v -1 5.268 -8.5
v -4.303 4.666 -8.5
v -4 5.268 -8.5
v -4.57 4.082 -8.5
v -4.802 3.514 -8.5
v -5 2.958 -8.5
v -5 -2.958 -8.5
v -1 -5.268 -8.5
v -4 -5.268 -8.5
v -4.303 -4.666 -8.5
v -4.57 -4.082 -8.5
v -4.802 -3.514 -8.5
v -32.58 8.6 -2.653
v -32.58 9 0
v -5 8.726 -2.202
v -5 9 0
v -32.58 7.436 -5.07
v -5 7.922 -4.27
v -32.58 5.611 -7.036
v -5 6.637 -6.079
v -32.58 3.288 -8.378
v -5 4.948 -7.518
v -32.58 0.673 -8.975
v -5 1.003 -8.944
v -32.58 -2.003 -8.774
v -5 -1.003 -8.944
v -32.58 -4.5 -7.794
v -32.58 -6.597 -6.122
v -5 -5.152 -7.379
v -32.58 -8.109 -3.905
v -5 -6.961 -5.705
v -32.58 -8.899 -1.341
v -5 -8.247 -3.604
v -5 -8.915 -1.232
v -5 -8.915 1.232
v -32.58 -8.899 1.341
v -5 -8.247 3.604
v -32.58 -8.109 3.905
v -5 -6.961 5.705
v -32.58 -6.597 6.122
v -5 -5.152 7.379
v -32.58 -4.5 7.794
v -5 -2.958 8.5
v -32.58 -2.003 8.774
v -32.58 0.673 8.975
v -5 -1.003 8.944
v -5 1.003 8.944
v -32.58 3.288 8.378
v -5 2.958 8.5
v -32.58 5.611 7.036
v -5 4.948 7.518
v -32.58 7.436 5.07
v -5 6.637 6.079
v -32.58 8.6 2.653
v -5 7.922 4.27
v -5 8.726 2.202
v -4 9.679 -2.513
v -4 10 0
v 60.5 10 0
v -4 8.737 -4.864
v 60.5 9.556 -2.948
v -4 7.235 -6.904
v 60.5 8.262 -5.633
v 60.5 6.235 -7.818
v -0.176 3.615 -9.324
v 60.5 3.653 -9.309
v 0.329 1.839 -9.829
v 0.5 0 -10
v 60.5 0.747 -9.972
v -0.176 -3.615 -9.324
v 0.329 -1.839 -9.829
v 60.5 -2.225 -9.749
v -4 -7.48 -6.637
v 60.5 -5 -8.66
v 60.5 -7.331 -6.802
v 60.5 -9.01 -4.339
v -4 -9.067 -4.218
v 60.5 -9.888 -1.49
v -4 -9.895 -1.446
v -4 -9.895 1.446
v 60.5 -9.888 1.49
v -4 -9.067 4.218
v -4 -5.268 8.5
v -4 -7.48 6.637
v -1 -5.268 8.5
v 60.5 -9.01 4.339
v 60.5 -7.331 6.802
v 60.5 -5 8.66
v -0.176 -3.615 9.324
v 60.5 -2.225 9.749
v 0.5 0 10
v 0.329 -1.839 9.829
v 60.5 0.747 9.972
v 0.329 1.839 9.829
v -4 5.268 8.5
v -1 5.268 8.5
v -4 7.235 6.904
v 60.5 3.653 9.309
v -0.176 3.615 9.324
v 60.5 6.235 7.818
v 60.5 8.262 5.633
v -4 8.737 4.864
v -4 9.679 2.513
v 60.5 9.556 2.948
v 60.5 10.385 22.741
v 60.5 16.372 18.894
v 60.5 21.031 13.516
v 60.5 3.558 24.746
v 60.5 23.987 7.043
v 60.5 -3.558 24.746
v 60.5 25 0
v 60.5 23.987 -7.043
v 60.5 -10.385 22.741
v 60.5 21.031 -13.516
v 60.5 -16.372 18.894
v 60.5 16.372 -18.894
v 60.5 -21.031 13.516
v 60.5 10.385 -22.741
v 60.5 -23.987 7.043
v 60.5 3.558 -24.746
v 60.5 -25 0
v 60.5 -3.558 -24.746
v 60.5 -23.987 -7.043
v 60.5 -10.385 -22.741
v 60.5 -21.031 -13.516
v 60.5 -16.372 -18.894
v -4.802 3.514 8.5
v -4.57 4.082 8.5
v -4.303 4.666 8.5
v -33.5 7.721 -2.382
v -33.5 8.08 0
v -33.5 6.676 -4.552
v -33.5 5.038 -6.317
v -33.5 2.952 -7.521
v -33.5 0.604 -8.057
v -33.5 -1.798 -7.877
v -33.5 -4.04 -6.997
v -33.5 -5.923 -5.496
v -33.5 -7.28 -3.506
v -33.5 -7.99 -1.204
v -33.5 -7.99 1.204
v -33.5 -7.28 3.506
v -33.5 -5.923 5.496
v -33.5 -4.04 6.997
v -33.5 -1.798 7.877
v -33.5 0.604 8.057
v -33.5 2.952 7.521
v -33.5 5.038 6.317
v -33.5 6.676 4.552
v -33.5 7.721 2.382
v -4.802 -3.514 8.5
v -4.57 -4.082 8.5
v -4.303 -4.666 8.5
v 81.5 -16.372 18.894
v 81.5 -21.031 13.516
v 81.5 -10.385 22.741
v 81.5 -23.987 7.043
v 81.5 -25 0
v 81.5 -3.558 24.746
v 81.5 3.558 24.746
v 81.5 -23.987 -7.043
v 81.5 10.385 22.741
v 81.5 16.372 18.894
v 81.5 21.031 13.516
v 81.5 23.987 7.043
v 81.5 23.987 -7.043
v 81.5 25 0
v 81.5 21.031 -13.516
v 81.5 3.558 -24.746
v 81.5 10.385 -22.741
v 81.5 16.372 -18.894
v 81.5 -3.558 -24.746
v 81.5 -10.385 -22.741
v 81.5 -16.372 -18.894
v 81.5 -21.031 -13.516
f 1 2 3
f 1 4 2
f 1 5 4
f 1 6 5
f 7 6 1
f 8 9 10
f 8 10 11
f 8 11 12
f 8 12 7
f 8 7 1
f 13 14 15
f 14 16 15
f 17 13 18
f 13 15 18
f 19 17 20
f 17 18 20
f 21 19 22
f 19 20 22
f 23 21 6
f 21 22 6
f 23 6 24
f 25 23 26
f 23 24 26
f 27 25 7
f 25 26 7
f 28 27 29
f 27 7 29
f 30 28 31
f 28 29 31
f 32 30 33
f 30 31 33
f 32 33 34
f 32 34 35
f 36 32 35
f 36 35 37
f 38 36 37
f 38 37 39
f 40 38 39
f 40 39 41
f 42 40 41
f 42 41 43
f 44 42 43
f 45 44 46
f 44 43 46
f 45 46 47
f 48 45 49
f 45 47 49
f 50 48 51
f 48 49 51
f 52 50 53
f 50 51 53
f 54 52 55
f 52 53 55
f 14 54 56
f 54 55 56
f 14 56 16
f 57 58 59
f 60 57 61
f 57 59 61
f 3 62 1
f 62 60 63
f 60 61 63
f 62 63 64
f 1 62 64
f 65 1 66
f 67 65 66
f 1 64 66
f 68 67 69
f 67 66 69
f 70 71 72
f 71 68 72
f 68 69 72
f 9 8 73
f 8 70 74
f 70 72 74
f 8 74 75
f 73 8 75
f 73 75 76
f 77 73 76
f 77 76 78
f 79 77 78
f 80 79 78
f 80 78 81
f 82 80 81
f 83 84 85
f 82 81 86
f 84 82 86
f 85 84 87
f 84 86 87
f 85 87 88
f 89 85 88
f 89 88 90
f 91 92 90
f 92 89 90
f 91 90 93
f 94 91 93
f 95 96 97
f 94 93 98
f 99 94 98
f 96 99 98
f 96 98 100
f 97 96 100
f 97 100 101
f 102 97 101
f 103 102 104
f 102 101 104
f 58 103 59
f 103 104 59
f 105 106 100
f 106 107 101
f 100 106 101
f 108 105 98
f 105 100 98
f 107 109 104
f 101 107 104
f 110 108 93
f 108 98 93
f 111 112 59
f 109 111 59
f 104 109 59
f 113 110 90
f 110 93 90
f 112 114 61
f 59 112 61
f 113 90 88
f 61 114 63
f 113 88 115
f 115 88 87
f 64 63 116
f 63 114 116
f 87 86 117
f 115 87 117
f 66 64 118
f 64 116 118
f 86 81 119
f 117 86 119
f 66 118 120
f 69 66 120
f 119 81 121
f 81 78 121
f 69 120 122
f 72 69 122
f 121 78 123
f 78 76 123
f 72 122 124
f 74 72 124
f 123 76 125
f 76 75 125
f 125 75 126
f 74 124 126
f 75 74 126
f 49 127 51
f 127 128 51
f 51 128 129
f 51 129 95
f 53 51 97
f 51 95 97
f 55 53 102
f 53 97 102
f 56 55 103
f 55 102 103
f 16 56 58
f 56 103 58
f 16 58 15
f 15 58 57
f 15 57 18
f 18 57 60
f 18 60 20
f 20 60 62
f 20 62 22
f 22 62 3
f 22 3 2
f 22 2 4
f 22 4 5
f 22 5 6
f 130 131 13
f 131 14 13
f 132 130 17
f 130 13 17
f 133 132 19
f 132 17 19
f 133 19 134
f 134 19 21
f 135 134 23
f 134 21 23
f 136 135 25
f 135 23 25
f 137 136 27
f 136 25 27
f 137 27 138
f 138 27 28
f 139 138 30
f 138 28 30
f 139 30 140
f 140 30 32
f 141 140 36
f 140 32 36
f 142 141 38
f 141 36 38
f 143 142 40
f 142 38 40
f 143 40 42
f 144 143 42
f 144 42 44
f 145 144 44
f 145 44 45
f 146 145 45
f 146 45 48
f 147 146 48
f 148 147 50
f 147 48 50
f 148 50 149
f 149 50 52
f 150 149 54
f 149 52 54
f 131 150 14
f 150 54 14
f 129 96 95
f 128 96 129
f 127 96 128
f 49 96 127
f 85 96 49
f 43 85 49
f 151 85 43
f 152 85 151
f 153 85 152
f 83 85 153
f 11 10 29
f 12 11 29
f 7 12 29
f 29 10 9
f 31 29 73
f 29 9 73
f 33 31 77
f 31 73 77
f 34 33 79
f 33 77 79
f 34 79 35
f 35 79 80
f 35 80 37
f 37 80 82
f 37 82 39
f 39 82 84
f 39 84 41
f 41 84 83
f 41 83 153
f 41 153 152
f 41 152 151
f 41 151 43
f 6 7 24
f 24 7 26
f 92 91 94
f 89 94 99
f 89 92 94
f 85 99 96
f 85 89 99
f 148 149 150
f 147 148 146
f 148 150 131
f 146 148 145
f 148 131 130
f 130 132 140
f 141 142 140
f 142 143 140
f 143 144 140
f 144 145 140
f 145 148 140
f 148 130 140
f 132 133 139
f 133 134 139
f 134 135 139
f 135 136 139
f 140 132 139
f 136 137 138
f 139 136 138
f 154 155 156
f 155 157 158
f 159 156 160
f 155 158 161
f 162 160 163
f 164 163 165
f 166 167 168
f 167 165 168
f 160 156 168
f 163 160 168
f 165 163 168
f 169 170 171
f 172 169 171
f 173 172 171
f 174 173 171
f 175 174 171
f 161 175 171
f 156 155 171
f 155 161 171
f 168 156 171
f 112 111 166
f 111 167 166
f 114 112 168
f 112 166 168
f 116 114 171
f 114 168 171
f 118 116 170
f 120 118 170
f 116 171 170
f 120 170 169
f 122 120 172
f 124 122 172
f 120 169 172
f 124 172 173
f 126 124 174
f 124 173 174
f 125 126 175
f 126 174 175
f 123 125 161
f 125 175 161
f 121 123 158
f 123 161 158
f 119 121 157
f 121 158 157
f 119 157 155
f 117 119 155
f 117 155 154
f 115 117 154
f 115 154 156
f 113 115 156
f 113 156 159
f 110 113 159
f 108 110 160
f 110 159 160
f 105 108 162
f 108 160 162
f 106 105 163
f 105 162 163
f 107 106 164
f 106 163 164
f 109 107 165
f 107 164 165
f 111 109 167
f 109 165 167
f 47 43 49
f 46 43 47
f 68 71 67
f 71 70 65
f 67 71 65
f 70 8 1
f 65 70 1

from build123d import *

# Parameters (mm, degrees)
CUT_EXTRUDE_1_DEPTH      = 17
CUT_EXTRUDE_1_DEPTH_BACK = 17


with BuildPart() as part:
    # 草图1 → 旋转1 (revolve)
    with BuildSketch(Plane.XY):
        Polygon((0, 0), (0, 10), (60.5, 10), (60.5, 25), (81.5, 25), (81.5, 0), align=None)
    revolve(axis=Axis((81.5, 0, 0), (-1, 0, 0)))

    # 草图2 → 旋转2 (revolve)
    with BuildSketch(Plane.XY):
        Polygon((-33.5, 0), (-33.5, 8.08), (-32.58, 9), (-5, 9), (-4, 10), (0, 10), (0, 0), align=None)
    revolve(axis=Axis((0, 0, 0), (-1, 0, 0)))

    # 草图3 → 切除-拉伸1 (cut, two sides: drawn at the far end of the back side and taken through both)
    with BuildSketch(Plane(origin=(0, 0, 0), x_dir=(1, 0, 0), z_dir=(0, 1, 0)).offset(-CUT_EXTRUDE_1_DEPTH_BACK)):
        Polygon((-43.5, -28.5), (19, -28.5), (-1, -8.5), (-5, -8.5), (-5, -18.5), (-33.5, -18.5), (-33.5, 18.5), (-5, 18.5), (-5, 8.5), (-1, 8.5), (19, 28.5), (-43.5, 28.5), align=None)
    extrude(amount=CUT_EXTRUDE_1_DEPTH + CUT_EXTRUDE_1_DEPTH_BACK, mode=Mode.SUBTRACT)


solid = part.part
